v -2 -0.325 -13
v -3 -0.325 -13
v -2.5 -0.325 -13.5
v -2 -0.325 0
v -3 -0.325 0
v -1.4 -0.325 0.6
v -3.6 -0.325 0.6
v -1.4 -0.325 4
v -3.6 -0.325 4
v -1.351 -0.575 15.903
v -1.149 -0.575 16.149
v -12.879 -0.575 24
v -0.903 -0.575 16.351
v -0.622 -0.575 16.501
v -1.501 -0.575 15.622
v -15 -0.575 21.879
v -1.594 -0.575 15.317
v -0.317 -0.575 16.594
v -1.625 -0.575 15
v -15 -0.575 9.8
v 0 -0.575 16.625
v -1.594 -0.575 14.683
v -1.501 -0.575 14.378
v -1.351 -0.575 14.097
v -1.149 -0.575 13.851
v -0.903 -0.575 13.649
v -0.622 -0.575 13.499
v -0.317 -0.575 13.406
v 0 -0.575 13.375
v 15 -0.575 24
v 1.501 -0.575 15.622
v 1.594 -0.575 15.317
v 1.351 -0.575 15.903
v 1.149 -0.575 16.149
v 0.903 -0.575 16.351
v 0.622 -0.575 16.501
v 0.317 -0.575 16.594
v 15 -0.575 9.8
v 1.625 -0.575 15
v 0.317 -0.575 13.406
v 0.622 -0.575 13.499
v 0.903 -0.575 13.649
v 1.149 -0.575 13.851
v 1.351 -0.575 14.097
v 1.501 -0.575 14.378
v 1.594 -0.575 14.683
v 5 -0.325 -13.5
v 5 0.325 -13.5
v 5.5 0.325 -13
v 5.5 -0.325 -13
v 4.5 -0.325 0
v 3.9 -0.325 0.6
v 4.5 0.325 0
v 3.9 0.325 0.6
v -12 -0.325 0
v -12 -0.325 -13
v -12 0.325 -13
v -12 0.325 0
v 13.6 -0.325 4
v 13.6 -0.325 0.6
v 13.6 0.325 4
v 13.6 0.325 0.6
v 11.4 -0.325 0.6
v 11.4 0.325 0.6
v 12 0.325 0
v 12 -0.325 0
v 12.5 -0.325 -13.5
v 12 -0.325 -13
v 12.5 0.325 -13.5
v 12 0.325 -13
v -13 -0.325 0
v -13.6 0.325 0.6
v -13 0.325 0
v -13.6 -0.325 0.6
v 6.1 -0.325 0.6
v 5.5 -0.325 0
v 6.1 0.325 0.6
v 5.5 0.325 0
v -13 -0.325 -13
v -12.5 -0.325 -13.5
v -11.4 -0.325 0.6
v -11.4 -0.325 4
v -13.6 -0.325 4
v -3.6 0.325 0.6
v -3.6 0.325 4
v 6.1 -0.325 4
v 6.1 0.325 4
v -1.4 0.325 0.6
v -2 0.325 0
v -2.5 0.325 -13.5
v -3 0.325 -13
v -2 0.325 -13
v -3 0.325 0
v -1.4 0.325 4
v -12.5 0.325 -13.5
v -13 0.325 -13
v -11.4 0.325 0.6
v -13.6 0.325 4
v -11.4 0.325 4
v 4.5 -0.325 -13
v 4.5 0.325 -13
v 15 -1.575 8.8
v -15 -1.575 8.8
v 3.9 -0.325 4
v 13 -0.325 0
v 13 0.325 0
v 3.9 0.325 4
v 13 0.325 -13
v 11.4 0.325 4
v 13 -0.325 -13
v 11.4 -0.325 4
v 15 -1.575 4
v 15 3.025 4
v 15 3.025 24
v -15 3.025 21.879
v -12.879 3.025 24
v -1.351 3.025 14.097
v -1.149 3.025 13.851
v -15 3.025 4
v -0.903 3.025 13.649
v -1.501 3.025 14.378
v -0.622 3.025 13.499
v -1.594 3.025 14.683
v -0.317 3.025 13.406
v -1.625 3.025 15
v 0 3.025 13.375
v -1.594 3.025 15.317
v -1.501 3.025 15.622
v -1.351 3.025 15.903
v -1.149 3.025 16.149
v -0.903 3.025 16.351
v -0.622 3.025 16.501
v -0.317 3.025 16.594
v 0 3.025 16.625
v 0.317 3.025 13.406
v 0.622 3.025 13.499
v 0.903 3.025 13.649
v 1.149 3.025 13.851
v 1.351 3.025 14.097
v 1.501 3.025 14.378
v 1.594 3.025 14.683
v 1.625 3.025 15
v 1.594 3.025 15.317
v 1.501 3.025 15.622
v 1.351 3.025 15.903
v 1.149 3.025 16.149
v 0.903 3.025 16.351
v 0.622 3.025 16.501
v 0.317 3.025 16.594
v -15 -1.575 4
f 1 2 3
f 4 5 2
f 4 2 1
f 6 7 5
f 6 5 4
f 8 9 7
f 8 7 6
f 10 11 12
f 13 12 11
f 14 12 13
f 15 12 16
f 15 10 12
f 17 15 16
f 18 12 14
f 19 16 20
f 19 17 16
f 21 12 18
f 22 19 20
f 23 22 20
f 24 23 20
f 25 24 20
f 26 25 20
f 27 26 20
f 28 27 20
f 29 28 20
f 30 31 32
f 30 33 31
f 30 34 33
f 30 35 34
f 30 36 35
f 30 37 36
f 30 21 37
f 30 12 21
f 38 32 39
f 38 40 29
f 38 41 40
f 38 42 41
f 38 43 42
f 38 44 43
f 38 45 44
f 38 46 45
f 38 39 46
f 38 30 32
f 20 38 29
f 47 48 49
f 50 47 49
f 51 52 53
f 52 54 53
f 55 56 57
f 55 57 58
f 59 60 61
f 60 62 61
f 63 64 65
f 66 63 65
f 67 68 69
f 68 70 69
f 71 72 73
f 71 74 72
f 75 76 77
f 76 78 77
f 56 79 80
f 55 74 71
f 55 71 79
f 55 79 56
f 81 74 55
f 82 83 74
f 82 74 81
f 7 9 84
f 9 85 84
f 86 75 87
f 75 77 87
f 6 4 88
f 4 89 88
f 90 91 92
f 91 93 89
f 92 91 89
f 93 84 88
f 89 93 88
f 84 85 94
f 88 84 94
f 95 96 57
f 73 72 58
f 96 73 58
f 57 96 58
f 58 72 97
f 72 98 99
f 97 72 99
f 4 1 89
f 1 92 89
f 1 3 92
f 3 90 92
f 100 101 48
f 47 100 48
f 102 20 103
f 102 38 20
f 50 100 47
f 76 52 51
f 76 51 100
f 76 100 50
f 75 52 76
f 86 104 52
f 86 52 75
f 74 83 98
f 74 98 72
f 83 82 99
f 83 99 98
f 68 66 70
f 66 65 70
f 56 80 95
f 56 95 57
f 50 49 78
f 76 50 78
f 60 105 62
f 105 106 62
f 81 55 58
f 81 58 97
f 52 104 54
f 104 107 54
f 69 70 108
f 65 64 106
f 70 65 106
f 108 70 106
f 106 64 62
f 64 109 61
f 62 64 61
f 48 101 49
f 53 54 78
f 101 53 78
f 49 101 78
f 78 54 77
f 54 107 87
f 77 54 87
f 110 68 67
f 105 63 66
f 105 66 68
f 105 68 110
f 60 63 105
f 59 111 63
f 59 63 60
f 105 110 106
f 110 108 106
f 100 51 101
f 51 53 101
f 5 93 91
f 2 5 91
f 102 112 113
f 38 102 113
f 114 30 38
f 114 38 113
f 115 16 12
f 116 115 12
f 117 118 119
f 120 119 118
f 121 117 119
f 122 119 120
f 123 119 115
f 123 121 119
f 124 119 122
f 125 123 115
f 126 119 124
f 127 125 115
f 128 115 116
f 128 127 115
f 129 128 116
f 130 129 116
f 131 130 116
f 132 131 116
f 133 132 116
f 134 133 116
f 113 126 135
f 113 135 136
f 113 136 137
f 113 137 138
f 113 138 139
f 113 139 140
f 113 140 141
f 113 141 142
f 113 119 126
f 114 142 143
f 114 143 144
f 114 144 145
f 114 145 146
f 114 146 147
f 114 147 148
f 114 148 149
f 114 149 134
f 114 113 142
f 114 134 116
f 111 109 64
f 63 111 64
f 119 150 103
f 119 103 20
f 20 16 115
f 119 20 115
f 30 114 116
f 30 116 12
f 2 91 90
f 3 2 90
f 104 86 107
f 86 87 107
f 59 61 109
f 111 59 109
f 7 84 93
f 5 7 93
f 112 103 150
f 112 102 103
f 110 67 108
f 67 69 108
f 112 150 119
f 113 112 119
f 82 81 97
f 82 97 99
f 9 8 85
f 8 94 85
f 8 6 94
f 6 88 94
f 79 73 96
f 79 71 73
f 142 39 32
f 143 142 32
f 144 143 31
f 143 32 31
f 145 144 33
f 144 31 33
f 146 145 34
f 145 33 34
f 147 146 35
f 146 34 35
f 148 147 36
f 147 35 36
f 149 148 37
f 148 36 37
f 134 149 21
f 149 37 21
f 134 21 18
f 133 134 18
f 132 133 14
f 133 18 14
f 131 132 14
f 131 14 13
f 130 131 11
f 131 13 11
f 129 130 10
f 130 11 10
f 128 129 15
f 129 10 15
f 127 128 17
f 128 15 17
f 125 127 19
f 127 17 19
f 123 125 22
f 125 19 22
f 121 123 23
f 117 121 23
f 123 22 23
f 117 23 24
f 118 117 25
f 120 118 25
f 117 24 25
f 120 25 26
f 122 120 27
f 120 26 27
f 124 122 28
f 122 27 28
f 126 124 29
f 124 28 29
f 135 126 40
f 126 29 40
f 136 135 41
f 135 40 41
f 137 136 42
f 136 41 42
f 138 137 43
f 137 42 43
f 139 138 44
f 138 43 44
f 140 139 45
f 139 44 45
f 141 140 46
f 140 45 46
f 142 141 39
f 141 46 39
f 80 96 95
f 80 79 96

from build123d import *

# Parameters (mm, degrees)
F1_DEPTH = 15
F2_R     = 1.625
F3_DEPTH = 3.6
F5_DEPTH = 0.325


with BuildPart() as f1:
    # F0 (on Right) → F1 (new body, symmetric)
    with BuildSketch(Plane.YZ):
        Polygon((-1.575, 4), (-0.325, 4), (0, 4), (0.325, 4), (3.025, 4), (3.025, 24), (-0.575, 24), (-0.575, 9.8), (-1.575, 8.8), align=None)
    extrude(amount=F1_DEPTH, both=True)

    # F2 (on face) → F3 (cut, through all)
    with BuildSketch(Plane.XZ.offset(0.575)):
        Polygon((-15, 24), (-15, 21.87868), (-12.87868, 24), align=None)
        with Locations((0, 15)):
            Circle(F2_R)
    extrude(amount=-F3_DEPTH, mode=Mode.SUBTRACT)


with BuildPart() as f5:
    # F4 (on Front) → F5 (new body, symmetric)
    with BuildSketch(Plane.XZ):
        Polygon((11.4, 0.6), (12, 0), (12, -13), (12.5, -13.5), (13, -13), (13, 0), (13.6, 0.6), (13.6, 4), (12.5, 4), (11.4, 4), align=None)
        Polygon((5.5, -13), (5.5, 0), (6.1, 0.6), (6.1, 4), (5, 4), (3.9, 4), (3.9, 0.6), (4.5, 0), (4.5, -13), (5, -13.5), align=None)
        Polygon((-3, -13), (-2.5, -13.5), (-2, -13), (-2, 0), (-1.4, 0.6), (-1.4, 4), (-2.5, 4), (-3.6, 4), (-3.6, 0.6), (-3, 0), align=None)
        Polygon((-13, -13), (-12.5, -13.5), (-12, -13), (-12, 0), (-11.4, 0.6), (-11.4, 4), (-12.5, 4), (-13.6, 4), (-13.6, 0.6), (-13, 0), align=None)
    extrude(amount=F5_DEPTH, both=True)


solid = Compound([f1.part, f5.part])
